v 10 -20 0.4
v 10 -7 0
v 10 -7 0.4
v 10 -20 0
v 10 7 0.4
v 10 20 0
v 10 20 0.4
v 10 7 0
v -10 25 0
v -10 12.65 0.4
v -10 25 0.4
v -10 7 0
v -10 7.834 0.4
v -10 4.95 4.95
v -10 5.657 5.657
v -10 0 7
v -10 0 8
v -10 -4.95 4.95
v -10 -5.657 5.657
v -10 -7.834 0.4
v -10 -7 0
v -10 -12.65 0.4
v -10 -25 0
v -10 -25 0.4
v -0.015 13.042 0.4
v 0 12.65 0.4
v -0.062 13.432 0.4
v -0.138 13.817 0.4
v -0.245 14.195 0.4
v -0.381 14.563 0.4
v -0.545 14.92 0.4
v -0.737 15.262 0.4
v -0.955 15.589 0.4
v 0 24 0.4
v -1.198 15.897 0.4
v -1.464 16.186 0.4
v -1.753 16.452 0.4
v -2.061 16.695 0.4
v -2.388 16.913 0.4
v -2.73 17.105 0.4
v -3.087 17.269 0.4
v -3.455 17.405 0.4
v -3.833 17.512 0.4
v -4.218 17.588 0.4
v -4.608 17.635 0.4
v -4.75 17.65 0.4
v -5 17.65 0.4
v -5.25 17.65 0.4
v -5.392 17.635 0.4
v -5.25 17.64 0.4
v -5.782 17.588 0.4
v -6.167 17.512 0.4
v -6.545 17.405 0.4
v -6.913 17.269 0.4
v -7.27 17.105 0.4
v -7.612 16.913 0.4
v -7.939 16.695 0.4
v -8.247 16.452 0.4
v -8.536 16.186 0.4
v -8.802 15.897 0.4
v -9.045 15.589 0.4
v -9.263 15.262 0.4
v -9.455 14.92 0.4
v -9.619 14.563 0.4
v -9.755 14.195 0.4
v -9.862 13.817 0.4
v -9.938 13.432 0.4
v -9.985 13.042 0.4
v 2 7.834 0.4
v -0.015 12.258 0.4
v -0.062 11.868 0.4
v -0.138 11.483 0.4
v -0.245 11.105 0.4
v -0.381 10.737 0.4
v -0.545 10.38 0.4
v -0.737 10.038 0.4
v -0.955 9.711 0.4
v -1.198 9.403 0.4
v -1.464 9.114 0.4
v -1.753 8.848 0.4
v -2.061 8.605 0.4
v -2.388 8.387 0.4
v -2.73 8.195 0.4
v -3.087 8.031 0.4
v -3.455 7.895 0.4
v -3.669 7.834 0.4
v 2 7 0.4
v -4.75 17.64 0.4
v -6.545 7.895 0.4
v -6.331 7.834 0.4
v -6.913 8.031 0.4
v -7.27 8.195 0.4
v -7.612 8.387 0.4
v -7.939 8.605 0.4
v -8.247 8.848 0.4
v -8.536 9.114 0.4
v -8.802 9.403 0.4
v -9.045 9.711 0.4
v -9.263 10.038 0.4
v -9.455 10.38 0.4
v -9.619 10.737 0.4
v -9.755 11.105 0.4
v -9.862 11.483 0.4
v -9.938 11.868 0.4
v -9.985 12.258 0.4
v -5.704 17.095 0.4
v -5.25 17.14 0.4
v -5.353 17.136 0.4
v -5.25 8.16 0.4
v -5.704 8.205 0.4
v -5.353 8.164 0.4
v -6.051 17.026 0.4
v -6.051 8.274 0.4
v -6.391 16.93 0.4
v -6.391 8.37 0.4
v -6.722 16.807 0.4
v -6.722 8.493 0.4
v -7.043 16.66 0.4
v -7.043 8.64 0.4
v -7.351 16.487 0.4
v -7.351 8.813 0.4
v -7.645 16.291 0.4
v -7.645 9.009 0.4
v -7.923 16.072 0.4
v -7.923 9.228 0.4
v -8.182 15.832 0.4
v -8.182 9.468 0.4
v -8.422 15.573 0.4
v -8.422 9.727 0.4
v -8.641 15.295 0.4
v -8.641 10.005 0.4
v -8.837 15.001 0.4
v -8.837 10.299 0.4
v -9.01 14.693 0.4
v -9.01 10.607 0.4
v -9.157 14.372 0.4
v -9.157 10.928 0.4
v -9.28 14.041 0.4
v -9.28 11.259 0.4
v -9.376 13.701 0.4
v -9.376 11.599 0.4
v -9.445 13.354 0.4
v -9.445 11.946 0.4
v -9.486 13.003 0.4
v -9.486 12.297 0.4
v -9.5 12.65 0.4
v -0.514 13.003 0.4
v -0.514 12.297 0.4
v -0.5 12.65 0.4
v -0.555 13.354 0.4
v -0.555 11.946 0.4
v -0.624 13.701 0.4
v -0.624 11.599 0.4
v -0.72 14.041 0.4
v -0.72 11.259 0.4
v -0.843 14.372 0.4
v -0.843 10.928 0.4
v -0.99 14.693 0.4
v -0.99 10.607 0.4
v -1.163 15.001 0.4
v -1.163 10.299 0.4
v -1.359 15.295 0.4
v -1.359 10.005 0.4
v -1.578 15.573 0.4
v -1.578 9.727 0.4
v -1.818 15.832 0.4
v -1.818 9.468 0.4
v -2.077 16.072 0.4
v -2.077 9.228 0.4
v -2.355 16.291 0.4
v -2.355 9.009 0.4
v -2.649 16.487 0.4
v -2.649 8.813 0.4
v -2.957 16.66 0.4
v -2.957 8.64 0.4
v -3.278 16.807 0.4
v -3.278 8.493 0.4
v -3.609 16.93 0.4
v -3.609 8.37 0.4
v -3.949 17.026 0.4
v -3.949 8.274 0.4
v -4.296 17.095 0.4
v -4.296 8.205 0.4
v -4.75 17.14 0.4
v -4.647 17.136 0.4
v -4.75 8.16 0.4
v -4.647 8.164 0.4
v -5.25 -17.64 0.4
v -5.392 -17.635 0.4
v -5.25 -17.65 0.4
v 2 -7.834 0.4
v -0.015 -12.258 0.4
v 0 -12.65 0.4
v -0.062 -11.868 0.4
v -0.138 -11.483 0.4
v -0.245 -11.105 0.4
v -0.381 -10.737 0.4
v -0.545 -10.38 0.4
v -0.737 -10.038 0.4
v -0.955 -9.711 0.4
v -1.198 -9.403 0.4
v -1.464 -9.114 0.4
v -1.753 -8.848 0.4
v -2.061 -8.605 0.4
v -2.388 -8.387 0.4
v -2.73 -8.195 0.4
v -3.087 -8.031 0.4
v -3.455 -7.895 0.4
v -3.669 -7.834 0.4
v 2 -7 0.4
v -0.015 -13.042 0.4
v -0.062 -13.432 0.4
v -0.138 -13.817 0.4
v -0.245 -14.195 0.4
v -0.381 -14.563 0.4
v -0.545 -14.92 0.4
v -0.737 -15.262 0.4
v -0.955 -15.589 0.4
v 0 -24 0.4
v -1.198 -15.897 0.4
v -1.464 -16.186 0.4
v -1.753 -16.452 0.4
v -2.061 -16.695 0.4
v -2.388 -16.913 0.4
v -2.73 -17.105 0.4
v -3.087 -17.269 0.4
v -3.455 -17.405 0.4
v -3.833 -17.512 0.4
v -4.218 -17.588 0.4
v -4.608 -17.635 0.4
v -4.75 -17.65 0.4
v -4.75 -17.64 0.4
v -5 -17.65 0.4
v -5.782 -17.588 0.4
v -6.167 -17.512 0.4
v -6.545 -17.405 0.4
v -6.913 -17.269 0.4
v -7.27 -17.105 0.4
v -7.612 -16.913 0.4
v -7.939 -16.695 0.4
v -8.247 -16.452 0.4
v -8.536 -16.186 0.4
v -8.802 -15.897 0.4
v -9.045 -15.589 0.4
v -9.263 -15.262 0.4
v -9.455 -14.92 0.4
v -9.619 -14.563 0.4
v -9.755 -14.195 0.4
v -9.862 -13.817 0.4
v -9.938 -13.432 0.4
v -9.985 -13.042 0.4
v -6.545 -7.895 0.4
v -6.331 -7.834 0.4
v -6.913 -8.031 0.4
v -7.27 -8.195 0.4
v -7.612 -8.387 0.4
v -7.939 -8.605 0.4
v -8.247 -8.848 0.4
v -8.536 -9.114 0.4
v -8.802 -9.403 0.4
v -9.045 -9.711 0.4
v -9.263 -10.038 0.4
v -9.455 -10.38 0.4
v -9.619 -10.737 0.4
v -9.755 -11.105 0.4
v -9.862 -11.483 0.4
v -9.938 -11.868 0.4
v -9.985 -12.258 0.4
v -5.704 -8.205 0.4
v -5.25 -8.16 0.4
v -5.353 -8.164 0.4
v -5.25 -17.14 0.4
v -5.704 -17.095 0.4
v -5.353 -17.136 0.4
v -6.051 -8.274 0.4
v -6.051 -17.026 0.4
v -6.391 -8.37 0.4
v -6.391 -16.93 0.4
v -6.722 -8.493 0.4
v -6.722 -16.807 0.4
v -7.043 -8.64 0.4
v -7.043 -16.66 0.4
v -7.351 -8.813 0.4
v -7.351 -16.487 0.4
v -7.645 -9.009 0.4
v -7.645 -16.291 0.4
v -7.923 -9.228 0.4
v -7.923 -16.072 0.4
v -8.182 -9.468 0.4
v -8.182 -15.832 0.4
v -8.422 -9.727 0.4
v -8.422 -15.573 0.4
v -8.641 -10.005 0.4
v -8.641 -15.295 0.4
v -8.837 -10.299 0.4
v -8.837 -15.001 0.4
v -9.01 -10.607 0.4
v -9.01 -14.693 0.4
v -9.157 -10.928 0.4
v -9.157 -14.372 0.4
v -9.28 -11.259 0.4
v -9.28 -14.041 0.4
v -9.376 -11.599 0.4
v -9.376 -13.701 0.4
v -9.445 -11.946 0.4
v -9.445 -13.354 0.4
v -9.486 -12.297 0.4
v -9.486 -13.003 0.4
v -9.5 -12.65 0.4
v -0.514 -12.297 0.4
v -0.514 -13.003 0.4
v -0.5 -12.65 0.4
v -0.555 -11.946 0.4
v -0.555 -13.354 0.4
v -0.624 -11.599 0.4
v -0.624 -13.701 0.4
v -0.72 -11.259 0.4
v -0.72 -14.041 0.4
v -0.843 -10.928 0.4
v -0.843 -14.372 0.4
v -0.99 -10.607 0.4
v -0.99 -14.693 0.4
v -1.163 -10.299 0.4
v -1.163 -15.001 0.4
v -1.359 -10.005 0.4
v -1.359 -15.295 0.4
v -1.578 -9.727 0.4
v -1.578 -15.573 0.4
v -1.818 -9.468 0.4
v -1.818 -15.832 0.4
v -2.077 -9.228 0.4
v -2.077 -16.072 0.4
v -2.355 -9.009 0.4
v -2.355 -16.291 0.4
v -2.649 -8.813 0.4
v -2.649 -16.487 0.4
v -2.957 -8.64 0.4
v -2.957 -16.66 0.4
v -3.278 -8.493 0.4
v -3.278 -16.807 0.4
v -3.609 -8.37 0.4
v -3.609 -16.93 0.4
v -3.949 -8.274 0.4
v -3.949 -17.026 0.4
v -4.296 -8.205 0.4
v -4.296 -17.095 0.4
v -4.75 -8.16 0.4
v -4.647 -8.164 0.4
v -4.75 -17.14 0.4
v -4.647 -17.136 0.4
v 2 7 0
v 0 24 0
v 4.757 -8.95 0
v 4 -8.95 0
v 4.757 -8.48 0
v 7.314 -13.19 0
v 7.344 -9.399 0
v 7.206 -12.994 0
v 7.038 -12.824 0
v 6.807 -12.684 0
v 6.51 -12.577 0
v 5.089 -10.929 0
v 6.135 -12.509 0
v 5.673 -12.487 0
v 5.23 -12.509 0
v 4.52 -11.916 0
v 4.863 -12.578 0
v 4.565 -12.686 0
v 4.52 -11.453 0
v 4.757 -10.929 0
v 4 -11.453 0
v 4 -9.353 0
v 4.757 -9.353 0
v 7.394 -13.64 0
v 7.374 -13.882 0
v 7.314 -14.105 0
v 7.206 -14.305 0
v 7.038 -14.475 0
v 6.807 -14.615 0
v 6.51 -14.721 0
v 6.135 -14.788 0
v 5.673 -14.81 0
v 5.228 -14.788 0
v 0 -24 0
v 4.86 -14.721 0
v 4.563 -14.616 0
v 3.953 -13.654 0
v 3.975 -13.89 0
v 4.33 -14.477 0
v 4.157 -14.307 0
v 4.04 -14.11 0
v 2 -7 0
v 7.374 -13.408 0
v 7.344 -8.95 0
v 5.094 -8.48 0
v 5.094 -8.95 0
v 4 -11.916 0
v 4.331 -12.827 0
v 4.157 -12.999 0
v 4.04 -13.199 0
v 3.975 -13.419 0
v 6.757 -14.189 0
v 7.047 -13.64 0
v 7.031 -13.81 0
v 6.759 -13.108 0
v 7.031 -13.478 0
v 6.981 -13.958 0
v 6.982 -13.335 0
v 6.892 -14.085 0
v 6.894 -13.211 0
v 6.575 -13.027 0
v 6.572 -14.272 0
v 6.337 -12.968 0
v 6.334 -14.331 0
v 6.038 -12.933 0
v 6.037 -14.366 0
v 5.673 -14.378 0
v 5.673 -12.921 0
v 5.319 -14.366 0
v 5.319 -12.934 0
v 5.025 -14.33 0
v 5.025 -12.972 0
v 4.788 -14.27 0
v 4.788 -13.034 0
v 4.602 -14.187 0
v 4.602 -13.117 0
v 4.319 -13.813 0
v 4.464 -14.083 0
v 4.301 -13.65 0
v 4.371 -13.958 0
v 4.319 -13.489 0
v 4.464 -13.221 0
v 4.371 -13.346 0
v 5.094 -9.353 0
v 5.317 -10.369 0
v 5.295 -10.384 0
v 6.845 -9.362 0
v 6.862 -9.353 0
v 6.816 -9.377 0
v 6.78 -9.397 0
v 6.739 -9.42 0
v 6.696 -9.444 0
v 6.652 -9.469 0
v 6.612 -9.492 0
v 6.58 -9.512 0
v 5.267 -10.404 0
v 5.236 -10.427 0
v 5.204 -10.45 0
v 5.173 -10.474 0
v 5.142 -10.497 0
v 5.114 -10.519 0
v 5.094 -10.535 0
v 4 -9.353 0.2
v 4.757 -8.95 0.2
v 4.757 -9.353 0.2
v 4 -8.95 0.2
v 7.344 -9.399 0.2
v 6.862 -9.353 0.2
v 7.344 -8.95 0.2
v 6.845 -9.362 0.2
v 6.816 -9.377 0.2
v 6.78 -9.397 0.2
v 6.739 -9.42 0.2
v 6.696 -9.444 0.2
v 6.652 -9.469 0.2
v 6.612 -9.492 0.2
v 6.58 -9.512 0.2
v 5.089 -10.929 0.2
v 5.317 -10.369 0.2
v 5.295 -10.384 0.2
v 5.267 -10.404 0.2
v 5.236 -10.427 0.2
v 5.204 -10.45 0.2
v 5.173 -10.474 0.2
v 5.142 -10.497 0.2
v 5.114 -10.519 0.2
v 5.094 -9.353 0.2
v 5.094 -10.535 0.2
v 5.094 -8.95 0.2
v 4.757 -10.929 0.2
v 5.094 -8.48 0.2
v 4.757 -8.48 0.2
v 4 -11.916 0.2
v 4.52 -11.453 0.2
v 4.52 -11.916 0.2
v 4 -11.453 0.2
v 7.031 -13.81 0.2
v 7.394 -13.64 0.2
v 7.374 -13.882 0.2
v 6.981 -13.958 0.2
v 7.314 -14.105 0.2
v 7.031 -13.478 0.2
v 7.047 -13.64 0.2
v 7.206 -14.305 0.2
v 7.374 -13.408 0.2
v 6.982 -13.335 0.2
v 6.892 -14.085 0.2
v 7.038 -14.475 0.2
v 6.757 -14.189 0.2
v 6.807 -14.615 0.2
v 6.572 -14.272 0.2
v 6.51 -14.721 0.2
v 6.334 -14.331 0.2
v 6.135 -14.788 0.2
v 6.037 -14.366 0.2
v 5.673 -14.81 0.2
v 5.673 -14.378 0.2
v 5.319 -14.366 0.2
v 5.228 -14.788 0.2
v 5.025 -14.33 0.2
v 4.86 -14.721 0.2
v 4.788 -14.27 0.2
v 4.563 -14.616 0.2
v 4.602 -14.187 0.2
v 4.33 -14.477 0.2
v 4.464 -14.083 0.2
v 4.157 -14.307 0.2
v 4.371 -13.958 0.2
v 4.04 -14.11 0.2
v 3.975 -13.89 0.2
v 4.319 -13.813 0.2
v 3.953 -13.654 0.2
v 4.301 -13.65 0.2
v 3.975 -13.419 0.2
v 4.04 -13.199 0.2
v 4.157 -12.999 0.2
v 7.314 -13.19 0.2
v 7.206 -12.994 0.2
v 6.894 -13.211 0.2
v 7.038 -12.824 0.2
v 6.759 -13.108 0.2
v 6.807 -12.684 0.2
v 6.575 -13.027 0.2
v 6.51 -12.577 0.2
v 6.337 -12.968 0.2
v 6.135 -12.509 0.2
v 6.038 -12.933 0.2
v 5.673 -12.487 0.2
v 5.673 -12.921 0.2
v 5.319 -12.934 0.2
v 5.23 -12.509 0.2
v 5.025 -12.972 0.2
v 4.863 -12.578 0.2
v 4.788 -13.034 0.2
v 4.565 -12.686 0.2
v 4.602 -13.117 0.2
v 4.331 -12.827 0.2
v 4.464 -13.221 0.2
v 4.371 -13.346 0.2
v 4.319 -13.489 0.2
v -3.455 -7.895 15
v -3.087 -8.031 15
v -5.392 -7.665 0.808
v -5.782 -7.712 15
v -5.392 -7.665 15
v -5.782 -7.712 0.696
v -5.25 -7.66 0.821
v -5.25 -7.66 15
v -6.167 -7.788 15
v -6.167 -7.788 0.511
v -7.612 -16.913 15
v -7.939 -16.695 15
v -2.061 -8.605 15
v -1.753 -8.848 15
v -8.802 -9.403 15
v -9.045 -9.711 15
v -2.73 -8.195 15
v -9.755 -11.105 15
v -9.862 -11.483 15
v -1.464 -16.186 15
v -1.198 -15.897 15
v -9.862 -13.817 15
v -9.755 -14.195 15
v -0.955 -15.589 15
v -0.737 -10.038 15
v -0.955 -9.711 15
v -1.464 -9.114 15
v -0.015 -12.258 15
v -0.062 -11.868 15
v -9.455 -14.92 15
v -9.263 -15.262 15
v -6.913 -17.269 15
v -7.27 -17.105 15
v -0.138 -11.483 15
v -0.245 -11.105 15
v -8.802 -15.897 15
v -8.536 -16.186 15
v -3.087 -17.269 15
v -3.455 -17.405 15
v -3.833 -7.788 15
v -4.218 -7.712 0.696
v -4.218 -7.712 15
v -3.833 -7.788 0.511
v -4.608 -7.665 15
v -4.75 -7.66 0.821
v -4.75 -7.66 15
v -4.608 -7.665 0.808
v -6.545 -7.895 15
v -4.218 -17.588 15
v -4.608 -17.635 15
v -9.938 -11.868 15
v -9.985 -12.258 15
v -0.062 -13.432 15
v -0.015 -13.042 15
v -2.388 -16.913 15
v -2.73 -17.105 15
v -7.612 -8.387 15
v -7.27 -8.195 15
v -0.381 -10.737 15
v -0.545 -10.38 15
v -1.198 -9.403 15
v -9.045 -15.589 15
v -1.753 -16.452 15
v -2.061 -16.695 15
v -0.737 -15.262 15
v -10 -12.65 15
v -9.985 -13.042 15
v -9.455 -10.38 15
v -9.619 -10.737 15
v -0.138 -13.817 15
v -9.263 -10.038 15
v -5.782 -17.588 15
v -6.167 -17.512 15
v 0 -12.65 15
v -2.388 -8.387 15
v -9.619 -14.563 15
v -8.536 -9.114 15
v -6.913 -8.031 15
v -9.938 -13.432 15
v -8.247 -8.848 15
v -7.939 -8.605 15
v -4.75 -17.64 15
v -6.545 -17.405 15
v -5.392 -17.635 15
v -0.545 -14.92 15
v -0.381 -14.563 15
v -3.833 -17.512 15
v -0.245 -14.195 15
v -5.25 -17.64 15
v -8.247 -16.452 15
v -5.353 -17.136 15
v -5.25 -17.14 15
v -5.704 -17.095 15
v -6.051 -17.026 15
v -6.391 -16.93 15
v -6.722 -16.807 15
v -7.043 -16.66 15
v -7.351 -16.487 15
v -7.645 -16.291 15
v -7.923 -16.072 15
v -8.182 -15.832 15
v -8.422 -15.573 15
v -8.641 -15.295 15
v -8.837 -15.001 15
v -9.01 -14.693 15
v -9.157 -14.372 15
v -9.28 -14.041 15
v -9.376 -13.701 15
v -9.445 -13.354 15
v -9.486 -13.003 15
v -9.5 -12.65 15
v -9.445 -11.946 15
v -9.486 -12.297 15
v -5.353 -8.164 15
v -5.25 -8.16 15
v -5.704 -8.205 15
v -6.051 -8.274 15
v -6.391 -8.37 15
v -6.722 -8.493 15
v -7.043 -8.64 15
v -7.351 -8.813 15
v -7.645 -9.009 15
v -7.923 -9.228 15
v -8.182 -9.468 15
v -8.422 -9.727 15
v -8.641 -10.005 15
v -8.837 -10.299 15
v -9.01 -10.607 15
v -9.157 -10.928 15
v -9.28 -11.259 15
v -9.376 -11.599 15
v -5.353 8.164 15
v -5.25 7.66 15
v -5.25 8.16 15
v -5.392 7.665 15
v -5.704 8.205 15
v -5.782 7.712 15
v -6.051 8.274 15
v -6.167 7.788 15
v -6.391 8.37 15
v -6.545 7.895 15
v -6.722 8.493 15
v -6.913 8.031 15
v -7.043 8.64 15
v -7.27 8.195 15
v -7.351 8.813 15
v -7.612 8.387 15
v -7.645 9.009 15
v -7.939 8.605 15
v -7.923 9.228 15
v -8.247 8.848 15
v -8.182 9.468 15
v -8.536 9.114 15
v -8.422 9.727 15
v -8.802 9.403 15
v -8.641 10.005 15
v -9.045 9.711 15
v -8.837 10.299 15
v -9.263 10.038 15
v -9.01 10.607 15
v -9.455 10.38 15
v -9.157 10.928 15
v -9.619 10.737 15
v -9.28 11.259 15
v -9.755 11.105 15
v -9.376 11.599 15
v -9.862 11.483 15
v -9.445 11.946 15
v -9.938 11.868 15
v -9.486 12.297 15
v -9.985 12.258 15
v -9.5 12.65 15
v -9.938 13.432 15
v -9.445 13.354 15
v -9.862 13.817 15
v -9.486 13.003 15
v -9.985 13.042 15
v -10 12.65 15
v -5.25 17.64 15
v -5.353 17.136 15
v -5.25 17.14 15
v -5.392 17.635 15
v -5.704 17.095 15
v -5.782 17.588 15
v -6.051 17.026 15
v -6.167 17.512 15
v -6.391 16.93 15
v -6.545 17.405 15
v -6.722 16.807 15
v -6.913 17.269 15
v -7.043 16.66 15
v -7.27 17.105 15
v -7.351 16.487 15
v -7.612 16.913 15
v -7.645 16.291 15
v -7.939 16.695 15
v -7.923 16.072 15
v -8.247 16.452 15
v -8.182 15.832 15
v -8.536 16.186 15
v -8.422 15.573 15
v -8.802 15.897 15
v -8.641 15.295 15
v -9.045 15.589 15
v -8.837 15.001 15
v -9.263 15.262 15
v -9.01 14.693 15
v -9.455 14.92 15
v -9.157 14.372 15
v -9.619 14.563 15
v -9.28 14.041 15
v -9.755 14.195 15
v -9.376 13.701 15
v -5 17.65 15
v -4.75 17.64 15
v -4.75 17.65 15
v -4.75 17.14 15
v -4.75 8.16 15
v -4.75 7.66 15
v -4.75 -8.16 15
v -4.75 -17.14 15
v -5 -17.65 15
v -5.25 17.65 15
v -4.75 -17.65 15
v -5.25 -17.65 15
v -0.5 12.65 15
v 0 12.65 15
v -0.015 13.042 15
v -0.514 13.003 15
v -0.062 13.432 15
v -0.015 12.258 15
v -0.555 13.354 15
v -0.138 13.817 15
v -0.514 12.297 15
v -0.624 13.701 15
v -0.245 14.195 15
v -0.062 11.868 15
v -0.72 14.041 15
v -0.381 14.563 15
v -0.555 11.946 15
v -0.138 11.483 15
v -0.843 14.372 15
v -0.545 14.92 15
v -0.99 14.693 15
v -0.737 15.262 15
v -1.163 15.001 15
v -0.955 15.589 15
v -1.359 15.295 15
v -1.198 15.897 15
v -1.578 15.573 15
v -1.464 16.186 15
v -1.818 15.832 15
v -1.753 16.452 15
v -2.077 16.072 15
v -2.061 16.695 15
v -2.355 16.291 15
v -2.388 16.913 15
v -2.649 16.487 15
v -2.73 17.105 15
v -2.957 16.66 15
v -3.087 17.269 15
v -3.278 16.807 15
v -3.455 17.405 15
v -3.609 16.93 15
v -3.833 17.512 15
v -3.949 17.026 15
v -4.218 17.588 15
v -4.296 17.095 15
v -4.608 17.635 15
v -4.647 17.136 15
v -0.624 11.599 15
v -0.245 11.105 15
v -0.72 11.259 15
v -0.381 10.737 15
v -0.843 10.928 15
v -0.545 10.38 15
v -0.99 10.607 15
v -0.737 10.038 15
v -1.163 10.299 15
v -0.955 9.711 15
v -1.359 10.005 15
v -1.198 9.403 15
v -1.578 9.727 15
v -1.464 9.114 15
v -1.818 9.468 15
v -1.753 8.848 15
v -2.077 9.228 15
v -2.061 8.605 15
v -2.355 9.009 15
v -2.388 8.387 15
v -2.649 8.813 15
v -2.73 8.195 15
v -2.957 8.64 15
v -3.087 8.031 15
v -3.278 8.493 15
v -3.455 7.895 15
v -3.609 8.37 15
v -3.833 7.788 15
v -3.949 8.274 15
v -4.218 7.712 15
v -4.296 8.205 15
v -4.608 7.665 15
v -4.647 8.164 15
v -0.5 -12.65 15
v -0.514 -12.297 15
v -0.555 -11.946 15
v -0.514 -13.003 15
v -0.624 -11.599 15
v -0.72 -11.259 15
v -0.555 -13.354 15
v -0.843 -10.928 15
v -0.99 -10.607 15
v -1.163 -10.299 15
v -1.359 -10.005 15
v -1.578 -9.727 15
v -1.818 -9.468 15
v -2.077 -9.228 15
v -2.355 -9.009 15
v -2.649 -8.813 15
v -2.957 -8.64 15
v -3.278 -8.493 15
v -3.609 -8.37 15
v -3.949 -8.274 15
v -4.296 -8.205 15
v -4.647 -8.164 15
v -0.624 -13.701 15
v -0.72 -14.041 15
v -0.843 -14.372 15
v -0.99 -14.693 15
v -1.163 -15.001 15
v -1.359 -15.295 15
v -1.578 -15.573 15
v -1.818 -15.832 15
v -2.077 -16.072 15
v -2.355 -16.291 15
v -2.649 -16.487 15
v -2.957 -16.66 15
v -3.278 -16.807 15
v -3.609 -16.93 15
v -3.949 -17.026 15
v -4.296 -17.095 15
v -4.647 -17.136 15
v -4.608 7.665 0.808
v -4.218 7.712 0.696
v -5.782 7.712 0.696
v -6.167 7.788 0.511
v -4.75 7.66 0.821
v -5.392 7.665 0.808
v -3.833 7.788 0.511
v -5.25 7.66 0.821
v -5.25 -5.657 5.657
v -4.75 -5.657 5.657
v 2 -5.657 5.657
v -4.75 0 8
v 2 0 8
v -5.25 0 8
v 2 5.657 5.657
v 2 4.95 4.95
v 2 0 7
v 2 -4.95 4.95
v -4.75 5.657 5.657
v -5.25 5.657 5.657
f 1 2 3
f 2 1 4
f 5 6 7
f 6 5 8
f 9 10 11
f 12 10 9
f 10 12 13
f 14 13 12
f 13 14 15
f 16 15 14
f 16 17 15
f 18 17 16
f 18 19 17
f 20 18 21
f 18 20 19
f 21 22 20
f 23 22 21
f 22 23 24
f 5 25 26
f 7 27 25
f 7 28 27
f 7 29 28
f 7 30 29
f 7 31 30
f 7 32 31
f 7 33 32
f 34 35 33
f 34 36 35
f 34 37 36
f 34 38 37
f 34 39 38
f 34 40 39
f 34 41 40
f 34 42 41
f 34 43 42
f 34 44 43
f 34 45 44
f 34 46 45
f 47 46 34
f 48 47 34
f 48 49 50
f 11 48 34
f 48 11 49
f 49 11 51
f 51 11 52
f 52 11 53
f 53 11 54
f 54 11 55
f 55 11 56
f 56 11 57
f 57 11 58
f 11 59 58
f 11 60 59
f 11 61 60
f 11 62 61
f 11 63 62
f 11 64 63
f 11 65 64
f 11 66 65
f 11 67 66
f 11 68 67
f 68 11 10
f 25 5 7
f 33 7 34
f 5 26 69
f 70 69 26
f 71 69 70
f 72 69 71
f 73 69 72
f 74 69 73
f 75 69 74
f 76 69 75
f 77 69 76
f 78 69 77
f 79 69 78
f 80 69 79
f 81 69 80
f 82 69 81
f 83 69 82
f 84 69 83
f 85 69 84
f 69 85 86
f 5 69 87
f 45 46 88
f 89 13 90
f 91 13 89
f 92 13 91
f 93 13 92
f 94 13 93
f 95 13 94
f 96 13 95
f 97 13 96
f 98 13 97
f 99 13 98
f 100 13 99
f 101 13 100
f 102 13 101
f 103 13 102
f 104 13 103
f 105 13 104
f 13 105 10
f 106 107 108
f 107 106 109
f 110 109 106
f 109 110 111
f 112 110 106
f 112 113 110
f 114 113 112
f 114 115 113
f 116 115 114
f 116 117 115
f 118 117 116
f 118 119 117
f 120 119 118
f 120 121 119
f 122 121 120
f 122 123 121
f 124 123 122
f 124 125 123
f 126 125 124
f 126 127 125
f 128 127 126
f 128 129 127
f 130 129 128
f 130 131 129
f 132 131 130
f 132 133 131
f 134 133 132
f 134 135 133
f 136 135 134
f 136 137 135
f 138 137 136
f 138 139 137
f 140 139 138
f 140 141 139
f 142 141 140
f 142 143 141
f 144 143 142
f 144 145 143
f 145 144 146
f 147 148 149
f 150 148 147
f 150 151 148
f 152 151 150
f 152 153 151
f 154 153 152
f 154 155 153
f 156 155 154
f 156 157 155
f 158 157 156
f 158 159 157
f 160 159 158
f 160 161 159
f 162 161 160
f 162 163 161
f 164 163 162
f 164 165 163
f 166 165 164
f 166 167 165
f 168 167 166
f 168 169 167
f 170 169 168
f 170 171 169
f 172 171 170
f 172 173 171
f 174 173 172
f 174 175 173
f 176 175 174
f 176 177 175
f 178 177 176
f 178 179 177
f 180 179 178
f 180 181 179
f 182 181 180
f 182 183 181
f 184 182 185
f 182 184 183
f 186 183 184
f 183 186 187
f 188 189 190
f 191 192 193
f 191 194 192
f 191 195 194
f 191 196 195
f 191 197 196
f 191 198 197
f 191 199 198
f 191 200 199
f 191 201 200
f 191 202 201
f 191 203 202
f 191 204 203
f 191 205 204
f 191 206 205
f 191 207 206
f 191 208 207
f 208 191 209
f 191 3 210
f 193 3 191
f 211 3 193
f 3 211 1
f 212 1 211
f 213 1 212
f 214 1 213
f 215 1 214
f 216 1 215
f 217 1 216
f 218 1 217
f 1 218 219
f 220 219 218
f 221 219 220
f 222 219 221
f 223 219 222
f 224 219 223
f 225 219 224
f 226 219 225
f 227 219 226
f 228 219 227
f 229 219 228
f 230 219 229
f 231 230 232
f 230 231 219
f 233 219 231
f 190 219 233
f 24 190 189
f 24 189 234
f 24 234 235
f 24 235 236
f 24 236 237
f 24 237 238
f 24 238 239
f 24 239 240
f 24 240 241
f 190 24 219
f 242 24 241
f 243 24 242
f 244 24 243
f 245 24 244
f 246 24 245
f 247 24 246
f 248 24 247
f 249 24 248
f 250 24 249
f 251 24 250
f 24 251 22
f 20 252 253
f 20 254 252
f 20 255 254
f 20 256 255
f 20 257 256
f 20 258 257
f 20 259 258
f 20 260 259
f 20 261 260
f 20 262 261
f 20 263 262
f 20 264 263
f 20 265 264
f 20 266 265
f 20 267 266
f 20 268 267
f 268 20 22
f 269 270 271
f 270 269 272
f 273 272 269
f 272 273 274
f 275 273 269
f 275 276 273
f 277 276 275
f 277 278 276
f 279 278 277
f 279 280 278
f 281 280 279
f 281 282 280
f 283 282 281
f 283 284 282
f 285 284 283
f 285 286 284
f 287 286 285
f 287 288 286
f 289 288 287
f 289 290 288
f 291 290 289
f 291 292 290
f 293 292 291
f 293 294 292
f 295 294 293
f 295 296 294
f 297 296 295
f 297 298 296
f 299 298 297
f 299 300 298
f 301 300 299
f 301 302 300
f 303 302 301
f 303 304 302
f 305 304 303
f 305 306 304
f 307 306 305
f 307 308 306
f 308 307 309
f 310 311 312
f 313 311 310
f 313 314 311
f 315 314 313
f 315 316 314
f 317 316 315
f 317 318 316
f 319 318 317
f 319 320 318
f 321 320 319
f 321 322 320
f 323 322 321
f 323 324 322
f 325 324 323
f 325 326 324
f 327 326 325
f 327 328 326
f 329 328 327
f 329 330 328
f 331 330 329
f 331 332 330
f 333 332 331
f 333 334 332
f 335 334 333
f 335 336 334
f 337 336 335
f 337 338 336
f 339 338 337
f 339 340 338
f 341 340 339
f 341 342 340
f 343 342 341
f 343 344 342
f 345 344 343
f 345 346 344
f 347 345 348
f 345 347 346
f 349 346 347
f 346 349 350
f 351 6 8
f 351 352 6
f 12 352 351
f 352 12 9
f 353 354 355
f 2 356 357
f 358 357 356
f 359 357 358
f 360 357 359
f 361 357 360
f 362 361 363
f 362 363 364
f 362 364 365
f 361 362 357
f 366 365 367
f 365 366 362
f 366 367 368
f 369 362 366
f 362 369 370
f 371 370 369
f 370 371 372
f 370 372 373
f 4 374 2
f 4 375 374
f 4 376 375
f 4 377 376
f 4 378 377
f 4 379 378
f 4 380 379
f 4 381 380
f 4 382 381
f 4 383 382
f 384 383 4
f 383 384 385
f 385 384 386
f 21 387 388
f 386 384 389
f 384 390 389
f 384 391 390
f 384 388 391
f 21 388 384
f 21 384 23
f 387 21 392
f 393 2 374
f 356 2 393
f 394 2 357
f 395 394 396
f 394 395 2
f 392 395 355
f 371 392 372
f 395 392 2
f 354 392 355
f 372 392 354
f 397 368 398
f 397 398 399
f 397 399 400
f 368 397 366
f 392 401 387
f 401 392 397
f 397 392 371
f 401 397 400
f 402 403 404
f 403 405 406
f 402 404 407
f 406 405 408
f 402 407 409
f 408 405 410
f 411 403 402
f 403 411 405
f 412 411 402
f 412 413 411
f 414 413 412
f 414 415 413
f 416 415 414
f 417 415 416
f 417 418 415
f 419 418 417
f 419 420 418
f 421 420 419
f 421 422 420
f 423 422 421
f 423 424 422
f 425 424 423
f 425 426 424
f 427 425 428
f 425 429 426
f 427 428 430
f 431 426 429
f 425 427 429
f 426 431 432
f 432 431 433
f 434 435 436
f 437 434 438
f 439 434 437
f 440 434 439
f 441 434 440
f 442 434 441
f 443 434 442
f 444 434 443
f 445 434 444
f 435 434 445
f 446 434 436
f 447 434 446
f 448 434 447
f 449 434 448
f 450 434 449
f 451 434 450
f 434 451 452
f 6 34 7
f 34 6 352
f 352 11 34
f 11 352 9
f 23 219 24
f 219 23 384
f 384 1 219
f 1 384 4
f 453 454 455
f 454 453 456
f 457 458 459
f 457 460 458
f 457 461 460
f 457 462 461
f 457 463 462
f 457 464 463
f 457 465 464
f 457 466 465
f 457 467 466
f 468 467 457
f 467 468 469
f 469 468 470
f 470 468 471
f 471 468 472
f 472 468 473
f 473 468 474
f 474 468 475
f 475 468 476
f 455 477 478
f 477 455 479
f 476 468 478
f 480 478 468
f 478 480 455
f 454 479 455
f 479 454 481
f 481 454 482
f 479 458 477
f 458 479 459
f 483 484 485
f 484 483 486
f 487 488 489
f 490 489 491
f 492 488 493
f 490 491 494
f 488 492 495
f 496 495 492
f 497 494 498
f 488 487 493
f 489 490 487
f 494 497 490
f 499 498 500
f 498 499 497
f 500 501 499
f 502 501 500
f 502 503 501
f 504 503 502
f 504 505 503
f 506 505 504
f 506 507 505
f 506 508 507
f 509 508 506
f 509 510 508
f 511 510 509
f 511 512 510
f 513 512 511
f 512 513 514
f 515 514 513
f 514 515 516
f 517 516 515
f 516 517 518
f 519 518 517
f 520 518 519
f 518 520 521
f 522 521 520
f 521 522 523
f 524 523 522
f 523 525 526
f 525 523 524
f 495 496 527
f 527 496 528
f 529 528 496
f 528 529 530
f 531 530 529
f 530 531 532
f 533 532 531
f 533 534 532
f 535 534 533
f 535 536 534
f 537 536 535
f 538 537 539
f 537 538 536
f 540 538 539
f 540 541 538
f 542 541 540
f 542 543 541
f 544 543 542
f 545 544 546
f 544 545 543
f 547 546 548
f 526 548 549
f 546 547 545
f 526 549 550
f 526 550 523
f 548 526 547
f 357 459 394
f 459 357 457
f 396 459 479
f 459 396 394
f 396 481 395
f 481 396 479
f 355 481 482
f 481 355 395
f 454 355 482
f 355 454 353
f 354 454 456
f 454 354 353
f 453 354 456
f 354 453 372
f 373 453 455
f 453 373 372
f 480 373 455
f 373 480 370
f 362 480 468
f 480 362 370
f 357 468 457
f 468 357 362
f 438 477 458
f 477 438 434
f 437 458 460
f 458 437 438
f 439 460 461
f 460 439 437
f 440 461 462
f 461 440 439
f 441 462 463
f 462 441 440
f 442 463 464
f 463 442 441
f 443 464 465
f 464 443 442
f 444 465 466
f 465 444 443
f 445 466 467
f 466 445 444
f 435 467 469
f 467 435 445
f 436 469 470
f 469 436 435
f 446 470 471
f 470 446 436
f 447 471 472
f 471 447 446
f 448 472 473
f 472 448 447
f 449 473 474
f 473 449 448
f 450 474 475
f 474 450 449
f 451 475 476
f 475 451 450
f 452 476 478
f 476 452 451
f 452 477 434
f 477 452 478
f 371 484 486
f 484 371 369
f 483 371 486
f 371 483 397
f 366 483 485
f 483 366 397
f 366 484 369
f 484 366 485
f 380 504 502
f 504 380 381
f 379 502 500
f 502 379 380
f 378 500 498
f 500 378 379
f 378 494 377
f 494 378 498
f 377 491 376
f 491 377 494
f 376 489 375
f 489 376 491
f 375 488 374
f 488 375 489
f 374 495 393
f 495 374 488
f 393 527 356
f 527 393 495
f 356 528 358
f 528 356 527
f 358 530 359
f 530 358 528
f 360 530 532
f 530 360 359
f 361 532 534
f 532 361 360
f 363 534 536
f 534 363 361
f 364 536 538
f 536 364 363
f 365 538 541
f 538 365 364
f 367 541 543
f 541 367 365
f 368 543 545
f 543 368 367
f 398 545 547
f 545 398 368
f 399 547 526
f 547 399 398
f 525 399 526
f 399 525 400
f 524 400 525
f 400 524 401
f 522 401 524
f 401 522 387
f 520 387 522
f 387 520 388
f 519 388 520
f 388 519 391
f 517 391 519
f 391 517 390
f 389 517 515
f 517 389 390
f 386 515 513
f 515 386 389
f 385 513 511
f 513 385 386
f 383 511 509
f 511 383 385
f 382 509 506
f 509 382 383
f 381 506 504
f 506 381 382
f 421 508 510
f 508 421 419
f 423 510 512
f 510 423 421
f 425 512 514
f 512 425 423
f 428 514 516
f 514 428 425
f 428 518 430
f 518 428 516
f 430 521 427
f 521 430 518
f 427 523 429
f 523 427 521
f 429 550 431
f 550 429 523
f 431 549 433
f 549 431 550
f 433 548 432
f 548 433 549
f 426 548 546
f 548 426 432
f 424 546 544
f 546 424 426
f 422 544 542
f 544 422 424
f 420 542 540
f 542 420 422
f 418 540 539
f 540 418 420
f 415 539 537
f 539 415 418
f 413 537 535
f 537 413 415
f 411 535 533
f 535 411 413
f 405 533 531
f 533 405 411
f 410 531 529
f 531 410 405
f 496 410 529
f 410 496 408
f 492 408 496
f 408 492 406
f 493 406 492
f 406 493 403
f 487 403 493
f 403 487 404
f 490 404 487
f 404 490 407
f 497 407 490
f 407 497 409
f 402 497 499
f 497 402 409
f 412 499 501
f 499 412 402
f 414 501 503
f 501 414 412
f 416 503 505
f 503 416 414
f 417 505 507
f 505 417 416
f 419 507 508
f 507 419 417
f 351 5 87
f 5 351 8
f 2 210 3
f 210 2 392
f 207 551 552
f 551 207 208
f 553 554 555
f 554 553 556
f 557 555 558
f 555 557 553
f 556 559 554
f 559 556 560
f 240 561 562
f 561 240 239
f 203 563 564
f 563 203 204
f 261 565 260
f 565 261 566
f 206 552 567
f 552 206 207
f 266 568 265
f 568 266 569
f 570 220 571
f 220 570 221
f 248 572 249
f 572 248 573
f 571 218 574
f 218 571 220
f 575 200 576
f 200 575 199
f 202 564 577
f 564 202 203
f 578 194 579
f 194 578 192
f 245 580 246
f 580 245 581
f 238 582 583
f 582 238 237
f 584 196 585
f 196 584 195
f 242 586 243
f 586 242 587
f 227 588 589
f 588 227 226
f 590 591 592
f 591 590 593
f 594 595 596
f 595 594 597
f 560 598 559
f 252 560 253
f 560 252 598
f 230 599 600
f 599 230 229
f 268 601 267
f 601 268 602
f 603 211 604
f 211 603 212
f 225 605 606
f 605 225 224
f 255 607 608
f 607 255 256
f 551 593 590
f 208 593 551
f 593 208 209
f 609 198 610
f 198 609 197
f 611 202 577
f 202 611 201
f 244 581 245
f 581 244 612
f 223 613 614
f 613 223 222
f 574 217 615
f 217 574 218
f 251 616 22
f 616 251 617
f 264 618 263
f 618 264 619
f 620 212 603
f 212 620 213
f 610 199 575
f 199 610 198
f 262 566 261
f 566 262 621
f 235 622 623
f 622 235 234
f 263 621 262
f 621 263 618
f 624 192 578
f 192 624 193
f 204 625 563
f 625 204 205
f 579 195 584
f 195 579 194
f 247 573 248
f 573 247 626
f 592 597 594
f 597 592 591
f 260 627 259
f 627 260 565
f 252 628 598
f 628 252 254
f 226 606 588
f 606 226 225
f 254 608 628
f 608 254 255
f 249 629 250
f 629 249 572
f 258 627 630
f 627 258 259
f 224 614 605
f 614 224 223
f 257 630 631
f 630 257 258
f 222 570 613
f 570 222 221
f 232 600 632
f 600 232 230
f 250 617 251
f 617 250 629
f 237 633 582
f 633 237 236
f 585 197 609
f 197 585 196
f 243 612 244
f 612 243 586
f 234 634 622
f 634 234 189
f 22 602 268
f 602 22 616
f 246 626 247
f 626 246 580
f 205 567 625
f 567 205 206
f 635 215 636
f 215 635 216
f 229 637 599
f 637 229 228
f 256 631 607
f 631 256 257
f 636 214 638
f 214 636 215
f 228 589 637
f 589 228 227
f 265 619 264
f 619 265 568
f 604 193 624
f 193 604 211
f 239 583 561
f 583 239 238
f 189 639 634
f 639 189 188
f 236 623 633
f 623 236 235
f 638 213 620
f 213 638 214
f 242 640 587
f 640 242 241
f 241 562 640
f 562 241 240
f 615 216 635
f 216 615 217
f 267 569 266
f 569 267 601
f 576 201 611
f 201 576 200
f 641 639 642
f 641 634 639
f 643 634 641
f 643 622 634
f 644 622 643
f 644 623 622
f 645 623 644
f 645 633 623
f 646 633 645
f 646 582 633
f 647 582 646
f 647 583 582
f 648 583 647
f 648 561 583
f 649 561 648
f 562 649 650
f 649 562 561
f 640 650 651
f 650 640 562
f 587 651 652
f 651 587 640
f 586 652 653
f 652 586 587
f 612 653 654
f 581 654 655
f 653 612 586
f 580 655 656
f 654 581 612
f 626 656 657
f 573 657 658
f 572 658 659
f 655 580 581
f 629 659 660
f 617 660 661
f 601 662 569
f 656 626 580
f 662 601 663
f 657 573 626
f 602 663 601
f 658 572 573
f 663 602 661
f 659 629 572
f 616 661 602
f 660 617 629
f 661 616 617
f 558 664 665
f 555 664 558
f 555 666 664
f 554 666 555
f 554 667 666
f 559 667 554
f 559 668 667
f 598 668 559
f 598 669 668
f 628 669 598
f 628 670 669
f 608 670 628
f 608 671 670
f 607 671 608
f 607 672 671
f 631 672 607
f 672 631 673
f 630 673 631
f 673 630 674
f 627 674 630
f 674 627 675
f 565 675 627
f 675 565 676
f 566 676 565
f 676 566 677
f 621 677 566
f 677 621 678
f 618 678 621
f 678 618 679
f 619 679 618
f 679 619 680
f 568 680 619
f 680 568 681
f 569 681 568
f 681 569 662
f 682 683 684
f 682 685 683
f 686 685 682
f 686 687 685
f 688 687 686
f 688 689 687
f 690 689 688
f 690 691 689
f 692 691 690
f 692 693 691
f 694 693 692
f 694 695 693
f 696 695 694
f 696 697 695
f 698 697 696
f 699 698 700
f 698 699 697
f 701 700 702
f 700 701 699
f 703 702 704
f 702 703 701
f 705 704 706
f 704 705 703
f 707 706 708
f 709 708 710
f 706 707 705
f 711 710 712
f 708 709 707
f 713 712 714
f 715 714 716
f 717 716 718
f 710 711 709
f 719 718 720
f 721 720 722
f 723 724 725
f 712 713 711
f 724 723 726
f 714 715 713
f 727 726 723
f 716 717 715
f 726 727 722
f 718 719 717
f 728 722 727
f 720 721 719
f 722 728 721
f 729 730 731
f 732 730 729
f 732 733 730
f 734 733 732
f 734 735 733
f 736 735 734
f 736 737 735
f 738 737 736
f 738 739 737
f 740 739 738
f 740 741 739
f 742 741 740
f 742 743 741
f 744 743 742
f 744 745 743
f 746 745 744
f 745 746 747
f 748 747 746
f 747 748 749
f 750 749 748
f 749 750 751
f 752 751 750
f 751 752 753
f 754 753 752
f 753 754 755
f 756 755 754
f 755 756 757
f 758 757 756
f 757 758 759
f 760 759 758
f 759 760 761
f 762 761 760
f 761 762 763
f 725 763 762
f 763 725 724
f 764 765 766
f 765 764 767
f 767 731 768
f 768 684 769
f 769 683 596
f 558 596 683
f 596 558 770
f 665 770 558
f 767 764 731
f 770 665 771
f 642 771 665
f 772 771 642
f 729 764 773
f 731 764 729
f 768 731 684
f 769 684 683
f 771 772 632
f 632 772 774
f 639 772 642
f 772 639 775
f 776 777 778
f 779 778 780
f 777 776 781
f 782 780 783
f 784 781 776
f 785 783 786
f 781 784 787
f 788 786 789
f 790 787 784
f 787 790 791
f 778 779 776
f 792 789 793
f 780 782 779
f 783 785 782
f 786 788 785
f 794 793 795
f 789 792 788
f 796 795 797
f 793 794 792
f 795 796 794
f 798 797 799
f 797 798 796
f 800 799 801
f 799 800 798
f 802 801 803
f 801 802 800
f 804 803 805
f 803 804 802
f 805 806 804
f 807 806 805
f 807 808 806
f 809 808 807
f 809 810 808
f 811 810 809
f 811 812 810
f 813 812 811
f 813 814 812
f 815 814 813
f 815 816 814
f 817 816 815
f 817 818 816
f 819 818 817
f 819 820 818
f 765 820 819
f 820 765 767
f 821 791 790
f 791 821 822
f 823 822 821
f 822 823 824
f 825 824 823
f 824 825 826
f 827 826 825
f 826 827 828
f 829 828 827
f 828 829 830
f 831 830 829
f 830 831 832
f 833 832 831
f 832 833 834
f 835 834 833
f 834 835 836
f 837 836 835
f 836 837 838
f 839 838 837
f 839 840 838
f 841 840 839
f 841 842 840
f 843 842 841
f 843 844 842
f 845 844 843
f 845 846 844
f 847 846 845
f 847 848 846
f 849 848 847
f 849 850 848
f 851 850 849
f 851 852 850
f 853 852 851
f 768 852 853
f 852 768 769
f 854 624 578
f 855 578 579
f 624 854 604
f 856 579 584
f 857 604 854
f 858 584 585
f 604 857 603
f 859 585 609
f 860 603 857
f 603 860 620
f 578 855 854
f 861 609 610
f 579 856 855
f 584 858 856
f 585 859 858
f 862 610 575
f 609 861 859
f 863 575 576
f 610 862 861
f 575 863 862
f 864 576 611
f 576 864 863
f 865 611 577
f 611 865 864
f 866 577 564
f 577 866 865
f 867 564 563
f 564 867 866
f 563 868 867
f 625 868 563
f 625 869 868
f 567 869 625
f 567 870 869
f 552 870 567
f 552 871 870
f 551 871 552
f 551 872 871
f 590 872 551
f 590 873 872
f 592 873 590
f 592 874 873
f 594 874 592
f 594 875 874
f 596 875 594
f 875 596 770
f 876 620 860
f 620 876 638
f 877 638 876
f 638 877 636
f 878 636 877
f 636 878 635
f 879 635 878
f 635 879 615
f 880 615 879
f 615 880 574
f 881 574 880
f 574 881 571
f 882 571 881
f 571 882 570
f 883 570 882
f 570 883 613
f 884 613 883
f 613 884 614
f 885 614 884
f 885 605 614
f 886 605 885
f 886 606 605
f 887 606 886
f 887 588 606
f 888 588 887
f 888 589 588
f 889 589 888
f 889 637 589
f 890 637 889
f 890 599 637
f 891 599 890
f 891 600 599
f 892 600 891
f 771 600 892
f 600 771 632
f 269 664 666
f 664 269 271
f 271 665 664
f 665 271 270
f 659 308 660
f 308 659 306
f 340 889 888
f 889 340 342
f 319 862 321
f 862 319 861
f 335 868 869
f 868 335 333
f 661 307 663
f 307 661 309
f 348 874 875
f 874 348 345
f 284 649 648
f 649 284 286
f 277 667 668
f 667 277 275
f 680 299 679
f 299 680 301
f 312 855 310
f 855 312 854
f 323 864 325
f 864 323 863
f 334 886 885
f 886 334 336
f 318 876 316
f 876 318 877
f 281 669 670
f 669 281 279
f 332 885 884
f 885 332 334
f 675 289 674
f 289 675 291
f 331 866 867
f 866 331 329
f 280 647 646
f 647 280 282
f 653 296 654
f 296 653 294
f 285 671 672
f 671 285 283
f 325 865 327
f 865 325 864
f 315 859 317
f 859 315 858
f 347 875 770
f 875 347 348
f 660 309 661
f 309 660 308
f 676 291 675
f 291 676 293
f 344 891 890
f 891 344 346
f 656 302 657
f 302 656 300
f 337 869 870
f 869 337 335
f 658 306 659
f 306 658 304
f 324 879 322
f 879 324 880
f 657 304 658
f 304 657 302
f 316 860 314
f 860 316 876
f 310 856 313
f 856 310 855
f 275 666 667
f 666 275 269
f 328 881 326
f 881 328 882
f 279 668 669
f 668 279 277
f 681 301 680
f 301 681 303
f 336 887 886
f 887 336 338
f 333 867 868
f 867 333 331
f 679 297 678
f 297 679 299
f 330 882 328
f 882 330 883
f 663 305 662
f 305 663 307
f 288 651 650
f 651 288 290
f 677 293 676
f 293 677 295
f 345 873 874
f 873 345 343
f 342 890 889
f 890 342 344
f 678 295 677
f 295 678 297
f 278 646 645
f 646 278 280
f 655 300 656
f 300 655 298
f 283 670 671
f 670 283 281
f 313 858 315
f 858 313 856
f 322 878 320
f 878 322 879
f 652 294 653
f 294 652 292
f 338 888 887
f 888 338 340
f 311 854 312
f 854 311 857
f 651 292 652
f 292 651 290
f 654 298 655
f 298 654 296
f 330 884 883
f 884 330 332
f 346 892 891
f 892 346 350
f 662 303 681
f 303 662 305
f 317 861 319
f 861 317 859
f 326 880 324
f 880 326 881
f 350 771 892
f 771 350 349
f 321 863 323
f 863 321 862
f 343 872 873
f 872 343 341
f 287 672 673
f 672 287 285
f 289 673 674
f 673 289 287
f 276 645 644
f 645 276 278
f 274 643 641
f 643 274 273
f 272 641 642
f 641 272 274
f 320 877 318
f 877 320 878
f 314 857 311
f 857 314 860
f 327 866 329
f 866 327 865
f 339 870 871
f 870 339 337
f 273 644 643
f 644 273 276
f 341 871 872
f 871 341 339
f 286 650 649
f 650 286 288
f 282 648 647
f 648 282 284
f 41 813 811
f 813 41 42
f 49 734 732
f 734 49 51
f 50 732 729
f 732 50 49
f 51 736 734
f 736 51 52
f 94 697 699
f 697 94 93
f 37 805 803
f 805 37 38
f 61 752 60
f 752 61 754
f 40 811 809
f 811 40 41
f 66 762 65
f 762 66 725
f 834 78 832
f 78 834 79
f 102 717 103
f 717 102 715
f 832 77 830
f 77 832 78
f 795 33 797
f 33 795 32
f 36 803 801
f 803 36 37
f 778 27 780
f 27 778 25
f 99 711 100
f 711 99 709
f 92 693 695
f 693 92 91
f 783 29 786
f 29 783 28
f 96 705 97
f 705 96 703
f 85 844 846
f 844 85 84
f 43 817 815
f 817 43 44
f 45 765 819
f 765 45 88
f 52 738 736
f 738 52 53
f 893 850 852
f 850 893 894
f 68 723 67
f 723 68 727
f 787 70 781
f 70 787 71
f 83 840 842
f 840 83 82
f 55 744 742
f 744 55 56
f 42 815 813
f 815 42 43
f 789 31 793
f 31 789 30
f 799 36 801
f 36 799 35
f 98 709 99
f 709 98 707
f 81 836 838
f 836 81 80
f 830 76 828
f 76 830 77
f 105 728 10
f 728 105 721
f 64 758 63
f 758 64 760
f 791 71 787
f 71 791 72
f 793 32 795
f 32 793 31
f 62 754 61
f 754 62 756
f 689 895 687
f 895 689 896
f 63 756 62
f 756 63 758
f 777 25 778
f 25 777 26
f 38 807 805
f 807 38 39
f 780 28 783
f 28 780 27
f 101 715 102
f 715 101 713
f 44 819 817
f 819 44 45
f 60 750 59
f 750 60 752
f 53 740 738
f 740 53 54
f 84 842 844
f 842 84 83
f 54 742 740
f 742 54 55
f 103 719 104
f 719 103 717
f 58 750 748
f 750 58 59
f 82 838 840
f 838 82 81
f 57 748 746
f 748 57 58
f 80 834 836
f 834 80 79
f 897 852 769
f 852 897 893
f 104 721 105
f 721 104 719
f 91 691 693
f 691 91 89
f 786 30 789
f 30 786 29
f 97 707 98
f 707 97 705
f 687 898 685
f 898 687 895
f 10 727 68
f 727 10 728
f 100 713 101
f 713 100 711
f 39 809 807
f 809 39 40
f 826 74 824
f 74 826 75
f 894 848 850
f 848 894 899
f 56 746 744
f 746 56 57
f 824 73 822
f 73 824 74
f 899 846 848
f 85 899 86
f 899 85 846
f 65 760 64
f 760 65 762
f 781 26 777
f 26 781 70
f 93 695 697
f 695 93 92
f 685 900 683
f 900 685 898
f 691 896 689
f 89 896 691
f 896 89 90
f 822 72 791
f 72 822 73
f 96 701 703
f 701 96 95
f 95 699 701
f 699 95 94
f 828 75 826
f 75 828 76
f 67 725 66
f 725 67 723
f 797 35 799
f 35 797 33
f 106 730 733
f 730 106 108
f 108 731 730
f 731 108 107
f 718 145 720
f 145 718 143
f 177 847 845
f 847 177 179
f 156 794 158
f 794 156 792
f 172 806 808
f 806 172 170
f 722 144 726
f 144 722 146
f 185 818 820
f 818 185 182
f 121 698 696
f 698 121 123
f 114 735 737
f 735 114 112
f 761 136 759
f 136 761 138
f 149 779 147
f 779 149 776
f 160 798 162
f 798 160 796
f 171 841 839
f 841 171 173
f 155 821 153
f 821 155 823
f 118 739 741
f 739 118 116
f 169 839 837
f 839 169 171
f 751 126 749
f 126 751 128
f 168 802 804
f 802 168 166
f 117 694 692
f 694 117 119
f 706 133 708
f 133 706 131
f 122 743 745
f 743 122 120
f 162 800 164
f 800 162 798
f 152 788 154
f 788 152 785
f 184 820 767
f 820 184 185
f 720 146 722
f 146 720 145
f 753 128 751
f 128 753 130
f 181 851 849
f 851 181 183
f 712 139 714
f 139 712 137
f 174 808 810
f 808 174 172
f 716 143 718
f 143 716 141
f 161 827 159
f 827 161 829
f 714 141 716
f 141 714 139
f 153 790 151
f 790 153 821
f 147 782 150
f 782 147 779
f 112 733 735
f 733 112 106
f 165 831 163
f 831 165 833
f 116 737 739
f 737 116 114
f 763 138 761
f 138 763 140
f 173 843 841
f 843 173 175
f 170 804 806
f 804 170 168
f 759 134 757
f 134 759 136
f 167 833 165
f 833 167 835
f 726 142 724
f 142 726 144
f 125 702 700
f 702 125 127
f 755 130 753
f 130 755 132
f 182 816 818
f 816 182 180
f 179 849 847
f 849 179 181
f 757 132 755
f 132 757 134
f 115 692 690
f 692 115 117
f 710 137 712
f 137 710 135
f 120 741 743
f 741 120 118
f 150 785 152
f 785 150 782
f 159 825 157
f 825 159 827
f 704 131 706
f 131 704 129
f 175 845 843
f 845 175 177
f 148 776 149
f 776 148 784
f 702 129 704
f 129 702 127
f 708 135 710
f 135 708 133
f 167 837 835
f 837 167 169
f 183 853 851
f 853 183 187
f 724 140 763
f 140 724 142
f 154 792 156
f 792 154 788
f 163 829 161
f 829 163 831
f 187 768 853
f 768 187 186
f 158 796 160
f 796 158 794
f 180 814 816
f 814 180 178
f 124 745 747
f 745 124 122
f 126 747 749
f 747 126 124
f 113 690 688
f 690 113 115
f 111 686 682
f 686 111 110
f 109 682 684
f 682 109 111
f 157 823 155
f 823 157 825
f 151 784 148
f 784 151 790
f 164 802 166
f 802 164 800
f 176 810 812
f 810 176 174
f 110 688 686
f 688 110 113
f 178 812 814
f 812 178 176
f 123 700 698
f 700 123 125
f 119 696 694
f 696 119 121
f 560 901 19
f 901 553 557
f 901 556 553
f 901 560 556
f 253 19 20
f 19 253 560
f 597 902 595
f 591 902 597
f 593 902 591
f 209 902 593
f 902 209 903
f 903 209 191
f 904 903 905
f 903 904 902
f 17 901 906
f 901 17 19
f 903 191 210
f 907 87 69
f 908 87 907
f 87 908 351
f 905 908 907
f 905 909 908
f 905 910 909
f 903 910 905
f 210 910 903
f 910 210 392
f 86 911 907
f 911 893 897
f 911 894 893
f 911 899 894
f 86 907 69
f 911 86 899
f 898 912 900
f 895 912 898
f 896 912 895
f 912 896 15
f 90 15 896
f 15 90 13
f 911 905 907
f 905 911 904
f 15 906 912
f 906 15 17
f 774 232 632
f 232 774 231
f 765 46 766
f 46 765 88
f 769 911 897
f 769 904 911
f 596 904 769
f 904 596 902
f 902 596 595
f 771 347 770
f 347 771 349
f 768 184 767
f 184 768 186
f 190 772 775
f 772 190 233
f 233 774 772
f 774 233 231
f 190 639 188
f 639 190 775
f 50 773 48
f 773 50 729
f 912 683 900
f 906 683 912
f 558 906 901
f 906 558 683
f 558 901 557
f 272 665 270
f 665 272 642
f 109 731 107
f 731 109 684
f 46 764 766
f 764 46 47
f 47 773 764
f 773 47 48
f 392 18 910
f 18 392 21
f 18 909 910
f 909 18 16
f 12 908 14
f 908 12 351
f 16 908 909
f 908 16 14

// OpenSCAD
height_base=0.4;
width_base1=50; //width on 0
width_base12=48;//width on lenght/2
width_base2=40; //width on lenght
lenght=20;
r_axis=7;
cutoff_axis=8;
offset_axis=4;
//stabiliser
width_st=35.3;
hoehe_st=15;
pos_st=5;
r_cylinder_st=5;

union(){
    translate([-lenght/2,-width_base1/2,0]){
        difference(){
            //Base polygon
            difference(){
                linear_extrude(height = height_base, center = false, convexity = 10, twist = 0, slices = 20, scale = 1.0){
                    polygon([[0,0],[0,width_base1],[lenght/2,width_base12+(width_base1-width_base12)/2],[lenght,width_base2+(width_base1-width_base2)/2],[lenght,(width_base1-width_base2)/2],[lenght/2,(width_base1-width_base12)/2]]);
                }
                translate([0,0,-0]){ //text to cut out
                    linear_extrude(height = 0.2, center = false, convexity = 10, twist = 0, slices = 20, scale = 1.0){
                        translate([pos_st+r_cylinder_st+4,lenght/2,0]){rotate([180,0,90]){text(str(height_base),size =3.5);}}
                    }
                }
            }
            //Cut out space between wings
            translate([0,width_base1/2-r_axis,-5*height_base]){
                cube([lenght,2*r_axis,10*height_base]);}
        }
    }
    
    rotate([-90,0,90]){
        difference(){
            union(){
                translate([0,0,offset_axis]) {cylinder(lenght-cutoff_axis,r_axis+1, r_axis+1,true,$fn=8);}
                rotate([0,0,-90]){
                    translate([0,-width_st/2,lenght/2-pos_st]){
                        linear_extrude(height = 0.5, center = true, convexity = 10, twist = 0, slices = 20, scale = 1.0){
                            //connector between stabilisers
                            polygon([[0,width_st],[hoehe_st,width_st],[hoehe_st,0],[0,0]]);}}}
            
                for(i=[-1:2:1]){ //stabiliser cylinders
                    translate([i*(width_st/2-r_cylinder_st),-hoehe_st/2,lenght/2-pos_st]){
                        rotate([90,0,-0]){
                            difference(){
                                cylinder(hoehe_st,r_cylinder_st,r_cylinder_st,true,$fn=80);
                                cylinder(hoehe_st,r_cylinder_st-0.5,r_cylinder_st-0.5,true,$fn=80);
                             }
                         }
                     }
                 }
            }
//            union(){ //to cut half pipe
                cylinder(lenght+10,r_axis,r_axis,true,$fn=8);
                translate([-2*r_axis,0,-2*r_axis]){cube(4*r_axis);}
            }
 
     
        }
    
    
    

    
    }
